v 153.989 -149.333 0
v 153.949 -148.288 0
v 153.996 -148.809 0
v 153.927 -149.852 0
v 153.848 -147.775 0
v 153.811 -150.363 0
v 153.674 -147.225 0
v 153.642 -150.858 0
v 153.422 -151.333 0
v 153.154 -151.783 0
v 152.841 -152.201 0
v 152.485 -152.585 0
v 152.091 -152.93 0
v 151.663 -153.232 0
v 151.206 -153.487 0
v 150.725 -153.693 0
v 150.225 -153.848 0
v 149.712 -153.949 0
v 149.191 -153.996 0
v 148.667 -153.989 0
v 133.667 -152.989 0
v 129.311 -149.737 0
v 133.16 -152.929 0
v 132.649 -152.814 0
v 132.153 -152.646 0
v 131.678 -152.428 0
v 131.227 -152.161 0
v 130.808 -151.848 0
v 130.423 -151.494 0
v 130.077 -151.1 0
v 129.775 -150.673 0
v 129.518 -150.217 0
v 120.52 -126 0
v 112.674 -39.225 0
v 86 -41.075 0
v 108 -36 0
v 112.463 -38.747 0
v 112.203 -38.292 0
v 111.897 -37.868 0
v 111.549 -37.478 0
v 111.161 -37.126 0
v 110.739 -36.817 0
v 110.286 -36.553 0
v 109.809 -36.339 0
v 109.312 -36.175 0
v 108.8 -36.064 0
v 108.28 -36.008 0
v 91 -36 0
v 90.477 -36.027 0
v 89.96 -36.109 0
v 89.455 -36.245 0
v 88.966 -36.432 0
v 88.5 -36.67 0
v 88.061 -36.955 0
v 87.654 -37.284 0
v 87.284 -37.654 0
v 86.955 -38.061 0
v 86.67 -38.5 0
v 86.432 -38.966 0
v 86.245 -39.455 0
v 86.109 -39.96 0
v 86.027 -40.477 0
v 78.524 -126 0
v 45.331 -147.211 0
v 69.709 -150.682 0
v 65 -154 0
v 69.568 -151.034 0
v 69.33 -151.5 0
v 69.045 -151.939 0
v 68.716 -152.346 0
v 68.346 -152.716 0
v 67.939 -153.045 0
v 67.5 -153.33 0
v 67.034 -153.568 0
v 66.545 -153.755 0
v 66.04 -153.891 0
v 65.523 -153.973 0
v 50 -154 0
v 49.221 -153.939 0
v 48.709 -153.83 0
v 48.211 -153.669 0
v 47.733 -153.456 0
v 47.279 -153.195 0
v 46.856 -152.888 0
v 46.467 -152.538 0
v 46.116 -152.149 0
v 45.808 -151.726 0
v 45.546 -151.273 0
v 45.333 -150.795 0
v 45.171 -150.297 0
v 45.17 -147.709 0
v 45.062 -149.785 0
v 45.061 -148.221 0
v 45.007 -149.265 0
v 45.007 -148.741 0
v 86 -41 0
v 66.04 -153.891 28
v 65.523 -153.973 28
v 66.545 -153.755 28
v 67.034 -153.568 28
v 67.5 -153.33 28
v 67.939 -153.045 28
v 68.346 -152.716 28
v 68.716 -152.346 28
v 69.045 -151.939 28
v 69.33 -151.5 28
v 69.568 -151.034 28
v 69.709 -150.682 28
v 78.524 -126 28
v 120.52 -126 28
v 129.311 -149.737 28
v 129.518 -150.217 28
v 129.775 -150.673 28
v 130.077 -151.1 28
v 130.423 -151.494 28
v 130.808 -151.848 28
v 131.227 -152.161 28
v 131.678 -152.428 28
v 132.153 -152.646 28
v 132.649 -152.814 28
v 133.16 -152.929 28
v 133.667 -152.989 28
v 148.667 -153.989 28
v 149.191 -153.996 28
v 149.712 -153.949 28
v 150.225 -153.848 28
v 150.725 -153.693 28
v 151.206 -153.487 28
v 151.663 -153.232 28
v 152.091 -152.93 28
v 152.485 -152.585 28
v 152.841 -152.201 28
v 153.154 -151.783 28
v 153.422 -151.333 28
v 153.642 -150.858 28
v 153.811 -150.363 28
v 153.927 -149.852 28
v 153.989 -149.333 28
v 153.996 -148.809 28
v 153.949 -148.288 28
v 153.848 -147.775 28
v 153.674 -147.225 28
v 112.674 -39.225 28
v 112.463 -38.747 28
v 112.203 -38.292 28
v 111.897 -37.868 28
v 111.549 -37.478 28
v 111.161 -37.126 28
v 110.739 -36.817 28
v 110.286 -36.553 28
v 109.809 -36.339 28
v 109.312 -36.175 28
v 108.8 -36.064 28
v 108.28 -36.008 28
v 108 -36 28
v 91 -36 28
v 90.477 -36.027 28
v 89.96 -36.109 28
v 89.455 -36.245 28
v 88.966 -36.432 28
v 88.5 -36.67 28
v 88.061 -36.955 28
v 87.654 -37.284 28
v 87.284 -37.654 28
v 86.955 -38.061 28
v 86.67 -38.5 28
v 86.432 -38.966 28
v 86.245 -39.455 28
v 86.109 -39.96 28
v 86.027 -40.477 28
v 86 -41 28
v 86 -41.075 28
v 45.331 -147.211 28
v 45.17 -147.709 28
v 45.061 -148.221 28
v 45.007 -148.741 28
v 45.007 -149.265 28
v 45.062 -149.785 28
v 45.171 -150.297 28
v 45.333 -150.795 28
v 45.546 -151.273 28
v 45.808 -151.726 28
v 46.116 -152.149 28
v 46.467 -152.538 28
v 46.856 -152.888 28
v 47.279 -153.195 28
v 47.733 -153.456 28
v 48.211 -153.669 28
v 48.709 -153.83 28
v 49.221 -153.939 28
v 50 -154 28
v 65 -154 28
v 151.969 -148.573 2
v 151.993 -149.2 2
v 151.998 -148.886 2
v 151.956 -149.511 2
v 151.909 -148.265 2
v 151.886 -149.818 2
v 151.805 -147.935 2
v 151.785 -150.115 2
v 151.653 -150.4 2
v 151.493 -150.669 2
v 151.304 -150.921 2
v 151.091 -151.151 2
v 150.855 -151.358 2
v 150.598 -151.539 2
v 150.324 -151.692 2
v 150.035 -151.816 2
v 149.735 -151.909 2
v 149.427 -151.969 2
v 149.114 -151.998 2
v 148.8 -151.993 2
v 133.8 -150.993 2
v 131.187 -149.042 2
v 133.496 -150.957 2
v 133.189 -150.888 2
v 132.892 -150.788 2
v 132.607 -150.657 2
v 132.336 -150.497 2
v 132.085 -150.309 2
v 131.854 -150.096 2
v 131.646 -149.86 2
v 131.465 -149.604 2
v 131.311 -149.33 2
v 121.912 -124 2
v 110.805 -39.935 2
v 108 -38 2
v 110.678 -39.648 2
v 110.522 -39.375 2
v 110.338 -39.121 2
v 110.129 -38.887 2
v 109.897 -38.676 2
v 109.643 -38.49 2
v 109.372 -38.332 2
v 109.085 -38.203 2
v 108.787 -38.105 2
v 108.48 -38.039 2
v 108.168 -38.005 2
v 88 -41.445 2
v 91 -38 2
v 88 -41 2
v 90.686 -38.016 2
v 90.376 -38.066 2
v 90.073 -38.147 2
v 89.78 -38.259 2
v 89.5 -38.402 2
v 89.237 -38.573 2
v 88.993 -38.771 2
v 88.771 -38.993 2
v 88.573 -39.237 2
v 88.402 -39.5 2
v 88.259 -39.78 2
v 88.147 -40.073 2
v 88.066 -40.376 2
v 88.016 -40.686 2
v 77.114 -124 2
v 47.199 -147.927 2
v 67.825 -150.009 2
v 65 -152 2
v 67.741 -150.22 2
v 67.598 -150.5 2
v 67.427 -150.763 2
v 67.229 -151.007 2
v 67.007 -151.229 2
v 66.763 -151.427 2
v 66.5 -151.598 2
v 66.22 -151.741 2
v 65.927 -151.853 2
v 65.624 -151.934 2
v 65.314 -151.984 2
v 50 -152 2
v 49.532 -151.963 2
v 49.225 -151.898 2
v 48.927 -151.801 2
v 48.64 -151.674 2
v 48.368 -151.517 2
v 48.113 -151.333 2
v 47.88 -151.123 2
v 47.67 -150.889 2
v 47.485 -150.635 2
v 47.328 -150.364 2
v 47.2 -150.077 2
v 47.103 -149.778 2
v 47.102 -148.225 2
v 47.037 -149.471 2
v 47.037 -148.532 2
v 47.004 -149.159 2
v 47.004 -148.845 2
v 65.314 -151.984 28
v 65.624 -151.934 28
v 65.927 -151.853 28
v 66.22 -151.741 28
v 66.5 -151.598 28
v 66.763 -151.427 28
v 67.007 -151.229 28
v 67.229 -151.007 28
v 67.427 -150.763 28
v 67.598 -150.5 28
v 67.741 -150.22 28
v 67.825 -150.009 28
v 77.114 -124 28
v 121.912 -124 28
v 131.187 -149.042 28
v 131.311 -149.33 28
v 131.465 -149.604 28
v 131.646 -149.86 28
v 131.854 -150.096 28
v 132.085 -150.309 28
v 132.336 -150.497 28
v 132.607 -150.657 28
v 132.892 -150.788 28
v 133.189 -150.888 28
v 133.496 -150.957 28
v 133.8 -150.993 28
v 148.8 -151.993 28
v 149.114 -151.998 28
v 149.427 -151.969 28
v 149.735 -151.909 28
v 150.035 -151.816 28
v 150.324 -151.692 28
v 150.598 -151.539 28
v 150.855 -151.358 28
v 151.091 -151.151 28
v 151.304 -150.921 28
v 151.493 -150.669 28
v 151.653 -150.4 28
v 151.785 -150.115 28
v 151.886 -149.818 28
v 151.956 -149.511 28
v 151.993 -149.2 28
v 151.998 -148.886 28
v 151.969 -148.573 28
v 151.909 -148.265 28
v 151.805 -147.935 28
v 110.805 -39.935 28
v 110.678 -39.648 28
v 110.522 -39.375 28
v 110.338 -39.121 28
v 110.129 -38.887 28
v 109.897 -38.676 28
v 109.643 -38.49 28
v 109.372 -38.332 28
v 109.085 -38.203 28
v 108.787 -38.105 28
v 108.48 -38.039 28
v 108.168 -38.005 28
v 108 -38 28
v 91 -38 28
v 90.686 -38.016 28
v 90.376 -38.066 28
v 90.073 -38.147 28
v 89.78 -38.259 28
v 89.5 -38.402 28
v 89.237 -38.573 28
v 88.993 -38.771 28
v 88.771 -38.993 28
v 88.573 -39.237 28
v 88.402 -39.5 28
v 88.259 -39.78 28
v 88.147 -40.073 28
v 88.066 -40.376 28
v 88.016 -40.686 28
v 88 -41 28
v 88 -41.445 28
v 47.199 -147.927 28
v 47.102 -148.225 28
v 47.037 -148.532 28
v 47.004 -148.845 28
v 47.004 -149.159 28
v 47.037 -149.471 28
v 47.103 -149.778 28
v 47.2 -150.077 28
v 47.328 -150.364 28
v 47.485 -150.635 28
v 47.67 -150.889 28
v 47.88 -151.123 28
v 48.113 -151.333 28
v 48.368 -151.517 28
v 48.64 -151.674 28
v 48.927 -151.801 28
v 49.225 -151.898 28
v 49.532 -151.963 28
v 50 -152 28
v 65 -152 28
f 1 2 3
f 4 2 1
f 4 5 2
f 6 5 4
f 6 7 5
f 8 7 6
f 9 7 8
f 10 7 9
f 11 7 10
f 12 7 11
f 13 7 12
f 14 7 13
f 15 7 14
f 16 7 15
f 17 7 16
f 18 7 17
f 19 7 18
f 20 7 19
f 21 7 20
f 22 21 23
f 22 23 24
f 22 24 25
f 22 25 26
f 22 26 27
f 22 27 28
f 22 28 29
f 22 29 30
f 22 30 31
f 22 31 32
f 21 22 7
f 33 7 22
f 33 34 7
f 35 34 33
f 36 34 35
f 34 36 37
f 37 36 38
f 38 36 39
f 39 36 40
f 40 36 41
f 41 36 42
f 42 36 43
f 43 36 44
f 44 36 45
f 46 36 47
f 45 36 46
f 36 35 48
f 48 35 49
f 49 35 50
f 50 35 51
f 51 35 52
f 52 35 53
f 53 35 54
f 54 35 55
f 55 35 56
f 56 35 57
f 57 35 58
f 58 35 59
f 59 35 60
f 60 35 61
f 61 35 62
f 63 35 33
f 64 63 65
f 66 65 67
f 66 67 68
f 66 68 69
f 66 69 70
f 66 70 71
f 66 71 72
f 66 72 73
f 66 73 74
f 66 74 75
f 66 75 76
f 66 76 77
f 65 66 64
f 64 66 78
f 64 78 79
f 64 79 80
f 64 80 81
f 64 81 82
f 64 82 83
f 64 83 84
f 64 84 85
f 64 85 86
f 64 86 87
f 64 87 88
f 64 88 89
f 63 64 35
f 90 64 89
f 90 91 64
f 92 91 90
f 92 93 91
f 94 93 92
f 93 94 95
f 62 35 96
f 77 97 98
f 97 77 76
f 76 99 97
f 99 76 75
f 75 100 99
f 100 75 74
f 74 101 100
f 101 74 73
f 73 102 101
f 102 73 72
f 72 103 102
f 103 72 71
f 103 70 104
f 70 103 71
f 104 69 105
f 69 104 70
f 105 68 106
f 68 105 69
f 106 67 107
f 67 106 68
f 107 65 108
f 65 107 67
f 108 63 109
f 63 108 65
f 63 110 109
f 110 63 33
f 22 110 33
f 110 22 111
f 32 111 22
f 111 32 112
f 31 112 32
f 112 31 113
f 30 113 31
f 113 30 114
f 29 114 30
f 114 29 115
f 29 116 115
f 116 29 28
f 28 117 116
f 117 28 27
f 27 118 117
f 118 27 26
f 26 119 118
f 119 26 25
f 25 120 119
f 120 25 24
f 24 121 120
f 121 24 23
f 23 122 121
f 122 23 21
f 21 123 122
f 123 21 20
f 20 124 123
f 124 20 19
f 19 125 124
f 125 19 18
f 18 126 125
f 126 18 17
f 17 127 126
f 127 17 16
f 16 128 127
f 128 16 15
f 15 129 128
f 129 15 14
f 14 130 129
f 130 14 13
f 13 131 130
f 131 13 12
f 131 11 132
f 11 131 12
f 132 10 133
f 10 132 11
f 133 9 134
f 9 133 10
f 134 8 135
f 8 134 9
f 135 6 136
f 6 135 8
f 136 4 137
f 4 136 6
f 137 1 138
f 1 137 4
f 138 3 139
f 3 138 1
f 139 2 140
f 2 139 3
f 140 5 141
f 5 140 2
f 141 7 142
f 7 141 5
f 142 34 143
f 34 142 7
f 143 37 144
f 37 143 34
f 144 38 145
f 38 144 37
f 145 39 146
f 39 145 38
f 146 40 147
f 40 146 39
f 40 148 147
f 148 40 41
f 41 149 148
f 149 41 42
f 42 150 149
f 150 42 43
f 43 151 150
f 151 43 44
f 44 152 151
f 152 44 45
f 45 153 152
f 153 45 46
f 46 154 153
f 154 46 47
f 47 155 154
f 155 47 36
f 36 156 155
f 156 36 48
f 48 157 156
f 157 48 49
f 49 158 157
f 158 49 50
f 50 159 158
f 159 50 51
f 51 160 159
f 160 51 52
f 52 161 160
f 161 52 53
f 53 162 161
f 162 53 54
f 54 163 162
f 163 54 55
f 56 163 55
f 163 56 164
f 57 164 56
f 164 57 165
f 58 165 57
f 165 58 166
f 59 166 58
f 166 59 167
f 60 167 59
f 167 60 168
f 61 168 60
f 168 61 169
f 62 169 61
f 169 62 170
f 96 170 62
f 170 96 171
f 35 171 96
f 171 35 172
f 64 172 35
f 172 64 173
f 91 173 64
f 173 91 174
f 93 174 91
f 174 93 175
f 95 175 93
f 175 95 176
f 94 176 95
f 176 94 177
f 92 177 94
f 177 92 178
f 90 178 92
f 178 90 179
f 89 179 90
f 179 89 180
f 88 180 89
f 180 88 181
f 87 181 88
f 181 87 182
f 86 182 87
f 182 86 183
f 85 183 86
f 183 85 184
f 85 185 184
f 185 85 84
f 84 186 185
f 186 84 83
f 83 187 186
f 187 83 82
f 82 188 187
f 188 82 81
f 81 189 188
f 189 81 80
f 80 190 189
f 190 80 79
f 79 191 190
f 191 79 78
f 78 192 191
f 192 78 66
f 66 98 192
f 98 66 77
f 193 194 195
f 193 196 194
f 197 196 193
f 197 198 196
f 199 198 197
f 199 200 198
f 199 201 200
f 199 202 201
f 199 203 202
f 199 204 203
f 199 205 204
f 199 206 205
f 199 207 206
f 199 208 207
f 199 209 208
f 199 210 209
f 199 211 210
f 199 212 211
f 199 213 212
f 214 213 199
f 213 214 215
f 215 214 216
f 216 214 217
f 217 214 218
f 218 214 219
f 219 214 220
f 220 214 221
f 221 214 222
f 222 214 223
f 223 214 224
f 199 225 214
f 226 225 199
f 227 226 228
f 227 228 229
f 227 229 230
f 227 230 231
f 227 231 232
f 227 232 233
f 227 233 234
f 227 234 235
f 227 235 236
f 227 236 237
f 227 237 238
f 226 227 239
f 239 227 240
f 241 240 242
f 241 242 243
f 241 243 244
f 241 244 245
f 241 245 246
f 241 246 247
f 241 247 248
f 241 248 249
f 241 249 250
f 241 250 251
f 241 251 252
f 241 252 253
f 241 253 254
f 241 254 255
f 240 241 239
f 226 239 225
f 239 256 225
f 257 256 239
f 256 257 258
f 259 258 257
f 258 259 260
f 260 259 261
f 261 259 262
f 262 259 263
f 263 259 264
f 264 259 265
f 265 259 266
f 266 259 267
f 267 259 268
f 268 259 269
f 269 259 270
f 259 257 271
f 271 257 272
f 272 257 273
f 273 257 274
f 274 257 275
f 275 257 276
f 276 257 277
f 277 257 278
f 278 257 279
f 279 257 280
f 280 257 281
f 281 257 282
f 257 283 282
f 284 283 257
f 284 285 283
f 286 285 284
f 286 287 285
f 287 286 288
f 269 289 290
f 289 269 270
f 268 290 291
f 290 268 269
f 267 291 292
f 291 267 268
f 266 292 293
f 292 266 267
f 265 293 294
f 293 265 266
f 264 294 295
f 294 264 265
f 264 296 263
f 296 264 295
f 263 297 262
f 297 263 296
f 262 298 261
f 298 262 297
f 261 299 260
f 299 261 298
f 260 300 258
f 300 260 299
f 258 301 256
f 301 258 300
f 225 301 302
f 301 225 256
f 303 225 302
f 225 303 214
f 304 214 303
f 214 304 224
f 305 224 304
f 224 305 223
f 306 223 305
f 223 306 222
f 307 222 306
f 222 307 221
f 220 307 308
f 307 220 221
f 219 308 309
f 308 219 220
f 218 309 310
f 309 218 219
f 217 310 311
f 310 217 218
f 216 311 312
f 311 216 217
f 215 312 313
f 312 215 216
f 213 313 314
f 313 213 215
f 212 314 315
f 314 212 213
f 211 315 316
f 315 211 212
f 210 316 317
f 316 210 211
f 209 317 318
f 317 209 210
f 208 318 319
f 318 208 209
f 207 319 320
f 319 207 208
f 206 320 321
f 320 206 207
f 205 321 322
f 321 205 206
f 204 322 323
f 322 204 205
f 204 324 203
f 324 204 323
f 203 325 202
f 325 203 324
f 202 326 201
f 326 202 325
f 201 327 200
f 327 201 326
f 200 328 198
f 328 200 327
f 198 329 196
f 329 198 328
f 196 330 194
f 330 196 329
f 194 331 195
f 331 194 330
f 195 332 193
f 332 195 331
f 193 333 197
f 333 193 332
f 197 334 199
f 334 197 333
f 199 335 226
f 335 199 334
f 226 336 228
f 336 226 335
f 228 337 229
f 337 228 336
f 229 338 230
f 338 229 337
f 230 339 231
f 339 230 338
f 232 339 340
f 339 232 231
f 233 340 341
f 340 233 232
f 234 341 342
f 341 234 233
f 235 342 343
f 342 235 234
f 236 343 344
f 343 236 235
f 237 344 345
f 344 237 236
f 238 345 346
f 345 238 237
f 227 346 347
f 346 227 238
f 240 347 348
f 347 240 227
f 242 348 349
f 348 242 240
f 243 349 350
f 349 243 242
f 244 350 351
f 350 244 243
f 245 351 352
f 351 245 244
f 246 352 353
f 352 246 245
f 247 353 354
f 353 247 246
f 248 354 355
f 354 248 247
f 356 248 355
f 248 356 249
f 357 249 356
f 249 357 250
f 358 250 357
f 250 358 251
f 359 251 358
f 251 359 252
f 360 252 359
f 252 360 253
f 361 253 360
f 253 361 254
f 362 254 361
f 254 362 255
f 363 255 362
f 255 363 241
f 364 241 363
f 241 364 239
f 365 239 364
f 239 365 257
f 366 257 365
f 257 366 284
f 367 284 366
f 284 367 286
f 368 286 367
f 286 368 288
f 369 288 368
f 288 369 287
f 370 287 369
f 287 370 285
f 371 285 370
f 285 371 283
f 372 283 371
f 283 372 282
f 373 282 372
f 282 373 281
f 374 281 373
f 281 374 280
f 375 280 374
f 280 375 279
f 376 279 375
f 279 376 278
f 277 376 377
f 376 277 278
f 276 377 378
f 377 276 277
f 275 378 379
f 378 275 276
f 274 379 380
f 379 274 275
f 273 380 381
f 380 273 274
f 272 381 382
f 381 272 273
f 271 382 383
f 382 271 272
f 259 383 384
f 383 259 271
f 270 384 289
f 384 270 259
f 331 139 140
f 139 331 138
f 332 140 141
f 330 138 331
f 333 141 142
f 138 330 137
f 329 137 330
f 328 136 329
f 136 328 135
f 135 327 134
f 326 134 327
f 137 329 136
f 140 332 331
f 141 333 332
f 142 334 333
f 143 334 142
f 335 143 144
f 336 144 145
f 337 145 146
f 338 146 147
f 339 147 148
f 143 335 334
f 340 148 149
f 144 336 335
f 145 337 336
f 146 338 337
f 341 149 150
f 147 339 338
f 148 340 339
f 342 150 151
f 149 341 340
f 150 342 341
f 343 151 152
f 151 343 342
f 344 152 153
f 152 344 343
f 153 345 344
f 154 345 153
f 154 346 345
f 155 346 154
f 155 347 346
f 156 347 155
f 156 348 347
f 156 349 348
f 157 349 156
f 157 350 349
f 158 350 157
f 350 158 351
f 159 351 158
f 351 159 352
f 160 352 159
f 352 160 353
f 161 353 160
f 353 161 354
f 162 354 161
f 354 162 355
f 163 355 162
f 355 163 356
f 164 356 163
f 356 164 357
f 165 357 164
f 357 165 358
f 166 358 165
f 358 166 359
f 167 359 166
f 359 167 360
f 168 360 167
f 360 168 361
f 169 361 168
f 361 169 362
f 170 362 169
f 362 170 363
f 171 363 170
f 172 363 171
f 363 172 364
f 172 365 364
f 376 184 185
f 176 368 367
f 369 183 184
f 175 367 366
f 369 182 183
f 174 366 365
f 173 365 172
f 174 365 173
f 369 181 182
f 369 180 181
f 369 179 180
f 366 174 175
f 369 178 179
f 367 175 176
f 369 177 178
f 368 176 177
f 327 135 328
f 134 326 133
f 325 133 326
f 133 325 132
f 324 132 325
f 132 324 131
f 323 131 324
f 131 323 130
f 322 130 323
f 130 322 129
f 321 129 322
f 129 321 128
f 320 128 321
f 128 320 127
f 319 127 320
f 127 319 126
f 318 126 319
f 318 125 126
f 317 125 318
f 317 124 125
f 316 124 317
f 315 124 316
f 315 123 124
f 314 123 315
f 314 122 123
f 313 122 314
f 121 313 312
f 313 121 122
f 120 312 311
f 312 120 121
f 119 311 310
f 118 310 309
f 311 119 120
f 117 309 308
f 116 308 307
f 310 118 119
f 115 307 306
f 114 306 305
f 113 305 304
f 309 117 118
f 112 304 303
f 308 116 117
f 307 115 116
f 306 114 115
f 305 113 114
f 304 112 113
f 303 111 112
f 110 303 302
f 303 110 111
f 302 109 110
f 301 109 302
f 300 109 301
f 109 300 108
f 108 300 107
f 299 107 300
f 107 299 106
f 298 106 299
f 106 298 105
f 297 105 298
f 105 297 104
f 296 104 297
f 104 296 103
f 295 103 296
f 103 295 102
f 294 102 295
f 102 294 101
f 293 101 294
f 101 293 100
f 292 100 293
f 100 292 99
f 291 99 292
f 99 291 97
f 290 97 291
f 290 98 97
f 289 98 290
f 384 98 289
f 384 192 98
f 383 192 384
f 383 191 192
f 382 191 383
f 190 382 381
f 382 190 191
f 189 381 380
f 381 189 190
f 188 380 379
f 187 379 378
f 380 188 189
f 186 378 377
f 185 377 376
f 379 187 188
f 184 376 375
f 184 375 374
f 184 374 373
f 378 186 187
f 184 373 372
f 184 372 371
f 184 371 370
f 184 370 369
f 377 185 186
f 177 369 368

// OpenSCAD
// AUTOMATICALLY GENERATED BY SCOTT ENGINE (Node.js)
// Source: test_letter_A.png
// Points: 9
$fn = 60;

// --- Configuration ---
Render_Mode = "Body"; // Options: "Body", "Lid"
Sign_Height = 30;
Wall_Thickness = 2;
Base_Thickness = 2;
Lid_Tolerance = 0.15;

// -- Engineering Constants --
CW = ("silicone_neon_6mm" == "silicone_neon_6mm") ? 6.0 : 8.0; 
Lip_Overhang = 0.4;

module core_shape() {
    // Scott-Peucker Optimized Vector Path
    polygon(points=[[91,-41],[108,-41],[149,-149],[134,-148],[124,-121],[75,-121],[65,-149],[50,-149],[91,-42]]);
}

module body_geometry() {
    difference() {
        linear_extrude(Sign_Height) offset(r = CW/2 + Wall_Thickness) core_shape();
        translate([0, 0, Base_Thickness]) linear_extrude(Sign_Height + 1) offset(r = CW/2) core_shape();
        
        // Friction Lip for Snap-Fit
        translate([0, 0, Sign_Height - 2.0]) linear_extrude(3.0)
            difference() {
                offset(r = CW/2 + 5) core_shape();
                offset(r = CW/2 - Lip_Overhang) core_shape();
            }
    }
}

module lid_geometry() {
    linear_extrude(2.0) offset(r = (CW/2 + 1.5) - Lid_Tolerance) core_shape();
}

if (Render_Mode == "Body") { body_geometry(); }
else { lid_geometry(); }
